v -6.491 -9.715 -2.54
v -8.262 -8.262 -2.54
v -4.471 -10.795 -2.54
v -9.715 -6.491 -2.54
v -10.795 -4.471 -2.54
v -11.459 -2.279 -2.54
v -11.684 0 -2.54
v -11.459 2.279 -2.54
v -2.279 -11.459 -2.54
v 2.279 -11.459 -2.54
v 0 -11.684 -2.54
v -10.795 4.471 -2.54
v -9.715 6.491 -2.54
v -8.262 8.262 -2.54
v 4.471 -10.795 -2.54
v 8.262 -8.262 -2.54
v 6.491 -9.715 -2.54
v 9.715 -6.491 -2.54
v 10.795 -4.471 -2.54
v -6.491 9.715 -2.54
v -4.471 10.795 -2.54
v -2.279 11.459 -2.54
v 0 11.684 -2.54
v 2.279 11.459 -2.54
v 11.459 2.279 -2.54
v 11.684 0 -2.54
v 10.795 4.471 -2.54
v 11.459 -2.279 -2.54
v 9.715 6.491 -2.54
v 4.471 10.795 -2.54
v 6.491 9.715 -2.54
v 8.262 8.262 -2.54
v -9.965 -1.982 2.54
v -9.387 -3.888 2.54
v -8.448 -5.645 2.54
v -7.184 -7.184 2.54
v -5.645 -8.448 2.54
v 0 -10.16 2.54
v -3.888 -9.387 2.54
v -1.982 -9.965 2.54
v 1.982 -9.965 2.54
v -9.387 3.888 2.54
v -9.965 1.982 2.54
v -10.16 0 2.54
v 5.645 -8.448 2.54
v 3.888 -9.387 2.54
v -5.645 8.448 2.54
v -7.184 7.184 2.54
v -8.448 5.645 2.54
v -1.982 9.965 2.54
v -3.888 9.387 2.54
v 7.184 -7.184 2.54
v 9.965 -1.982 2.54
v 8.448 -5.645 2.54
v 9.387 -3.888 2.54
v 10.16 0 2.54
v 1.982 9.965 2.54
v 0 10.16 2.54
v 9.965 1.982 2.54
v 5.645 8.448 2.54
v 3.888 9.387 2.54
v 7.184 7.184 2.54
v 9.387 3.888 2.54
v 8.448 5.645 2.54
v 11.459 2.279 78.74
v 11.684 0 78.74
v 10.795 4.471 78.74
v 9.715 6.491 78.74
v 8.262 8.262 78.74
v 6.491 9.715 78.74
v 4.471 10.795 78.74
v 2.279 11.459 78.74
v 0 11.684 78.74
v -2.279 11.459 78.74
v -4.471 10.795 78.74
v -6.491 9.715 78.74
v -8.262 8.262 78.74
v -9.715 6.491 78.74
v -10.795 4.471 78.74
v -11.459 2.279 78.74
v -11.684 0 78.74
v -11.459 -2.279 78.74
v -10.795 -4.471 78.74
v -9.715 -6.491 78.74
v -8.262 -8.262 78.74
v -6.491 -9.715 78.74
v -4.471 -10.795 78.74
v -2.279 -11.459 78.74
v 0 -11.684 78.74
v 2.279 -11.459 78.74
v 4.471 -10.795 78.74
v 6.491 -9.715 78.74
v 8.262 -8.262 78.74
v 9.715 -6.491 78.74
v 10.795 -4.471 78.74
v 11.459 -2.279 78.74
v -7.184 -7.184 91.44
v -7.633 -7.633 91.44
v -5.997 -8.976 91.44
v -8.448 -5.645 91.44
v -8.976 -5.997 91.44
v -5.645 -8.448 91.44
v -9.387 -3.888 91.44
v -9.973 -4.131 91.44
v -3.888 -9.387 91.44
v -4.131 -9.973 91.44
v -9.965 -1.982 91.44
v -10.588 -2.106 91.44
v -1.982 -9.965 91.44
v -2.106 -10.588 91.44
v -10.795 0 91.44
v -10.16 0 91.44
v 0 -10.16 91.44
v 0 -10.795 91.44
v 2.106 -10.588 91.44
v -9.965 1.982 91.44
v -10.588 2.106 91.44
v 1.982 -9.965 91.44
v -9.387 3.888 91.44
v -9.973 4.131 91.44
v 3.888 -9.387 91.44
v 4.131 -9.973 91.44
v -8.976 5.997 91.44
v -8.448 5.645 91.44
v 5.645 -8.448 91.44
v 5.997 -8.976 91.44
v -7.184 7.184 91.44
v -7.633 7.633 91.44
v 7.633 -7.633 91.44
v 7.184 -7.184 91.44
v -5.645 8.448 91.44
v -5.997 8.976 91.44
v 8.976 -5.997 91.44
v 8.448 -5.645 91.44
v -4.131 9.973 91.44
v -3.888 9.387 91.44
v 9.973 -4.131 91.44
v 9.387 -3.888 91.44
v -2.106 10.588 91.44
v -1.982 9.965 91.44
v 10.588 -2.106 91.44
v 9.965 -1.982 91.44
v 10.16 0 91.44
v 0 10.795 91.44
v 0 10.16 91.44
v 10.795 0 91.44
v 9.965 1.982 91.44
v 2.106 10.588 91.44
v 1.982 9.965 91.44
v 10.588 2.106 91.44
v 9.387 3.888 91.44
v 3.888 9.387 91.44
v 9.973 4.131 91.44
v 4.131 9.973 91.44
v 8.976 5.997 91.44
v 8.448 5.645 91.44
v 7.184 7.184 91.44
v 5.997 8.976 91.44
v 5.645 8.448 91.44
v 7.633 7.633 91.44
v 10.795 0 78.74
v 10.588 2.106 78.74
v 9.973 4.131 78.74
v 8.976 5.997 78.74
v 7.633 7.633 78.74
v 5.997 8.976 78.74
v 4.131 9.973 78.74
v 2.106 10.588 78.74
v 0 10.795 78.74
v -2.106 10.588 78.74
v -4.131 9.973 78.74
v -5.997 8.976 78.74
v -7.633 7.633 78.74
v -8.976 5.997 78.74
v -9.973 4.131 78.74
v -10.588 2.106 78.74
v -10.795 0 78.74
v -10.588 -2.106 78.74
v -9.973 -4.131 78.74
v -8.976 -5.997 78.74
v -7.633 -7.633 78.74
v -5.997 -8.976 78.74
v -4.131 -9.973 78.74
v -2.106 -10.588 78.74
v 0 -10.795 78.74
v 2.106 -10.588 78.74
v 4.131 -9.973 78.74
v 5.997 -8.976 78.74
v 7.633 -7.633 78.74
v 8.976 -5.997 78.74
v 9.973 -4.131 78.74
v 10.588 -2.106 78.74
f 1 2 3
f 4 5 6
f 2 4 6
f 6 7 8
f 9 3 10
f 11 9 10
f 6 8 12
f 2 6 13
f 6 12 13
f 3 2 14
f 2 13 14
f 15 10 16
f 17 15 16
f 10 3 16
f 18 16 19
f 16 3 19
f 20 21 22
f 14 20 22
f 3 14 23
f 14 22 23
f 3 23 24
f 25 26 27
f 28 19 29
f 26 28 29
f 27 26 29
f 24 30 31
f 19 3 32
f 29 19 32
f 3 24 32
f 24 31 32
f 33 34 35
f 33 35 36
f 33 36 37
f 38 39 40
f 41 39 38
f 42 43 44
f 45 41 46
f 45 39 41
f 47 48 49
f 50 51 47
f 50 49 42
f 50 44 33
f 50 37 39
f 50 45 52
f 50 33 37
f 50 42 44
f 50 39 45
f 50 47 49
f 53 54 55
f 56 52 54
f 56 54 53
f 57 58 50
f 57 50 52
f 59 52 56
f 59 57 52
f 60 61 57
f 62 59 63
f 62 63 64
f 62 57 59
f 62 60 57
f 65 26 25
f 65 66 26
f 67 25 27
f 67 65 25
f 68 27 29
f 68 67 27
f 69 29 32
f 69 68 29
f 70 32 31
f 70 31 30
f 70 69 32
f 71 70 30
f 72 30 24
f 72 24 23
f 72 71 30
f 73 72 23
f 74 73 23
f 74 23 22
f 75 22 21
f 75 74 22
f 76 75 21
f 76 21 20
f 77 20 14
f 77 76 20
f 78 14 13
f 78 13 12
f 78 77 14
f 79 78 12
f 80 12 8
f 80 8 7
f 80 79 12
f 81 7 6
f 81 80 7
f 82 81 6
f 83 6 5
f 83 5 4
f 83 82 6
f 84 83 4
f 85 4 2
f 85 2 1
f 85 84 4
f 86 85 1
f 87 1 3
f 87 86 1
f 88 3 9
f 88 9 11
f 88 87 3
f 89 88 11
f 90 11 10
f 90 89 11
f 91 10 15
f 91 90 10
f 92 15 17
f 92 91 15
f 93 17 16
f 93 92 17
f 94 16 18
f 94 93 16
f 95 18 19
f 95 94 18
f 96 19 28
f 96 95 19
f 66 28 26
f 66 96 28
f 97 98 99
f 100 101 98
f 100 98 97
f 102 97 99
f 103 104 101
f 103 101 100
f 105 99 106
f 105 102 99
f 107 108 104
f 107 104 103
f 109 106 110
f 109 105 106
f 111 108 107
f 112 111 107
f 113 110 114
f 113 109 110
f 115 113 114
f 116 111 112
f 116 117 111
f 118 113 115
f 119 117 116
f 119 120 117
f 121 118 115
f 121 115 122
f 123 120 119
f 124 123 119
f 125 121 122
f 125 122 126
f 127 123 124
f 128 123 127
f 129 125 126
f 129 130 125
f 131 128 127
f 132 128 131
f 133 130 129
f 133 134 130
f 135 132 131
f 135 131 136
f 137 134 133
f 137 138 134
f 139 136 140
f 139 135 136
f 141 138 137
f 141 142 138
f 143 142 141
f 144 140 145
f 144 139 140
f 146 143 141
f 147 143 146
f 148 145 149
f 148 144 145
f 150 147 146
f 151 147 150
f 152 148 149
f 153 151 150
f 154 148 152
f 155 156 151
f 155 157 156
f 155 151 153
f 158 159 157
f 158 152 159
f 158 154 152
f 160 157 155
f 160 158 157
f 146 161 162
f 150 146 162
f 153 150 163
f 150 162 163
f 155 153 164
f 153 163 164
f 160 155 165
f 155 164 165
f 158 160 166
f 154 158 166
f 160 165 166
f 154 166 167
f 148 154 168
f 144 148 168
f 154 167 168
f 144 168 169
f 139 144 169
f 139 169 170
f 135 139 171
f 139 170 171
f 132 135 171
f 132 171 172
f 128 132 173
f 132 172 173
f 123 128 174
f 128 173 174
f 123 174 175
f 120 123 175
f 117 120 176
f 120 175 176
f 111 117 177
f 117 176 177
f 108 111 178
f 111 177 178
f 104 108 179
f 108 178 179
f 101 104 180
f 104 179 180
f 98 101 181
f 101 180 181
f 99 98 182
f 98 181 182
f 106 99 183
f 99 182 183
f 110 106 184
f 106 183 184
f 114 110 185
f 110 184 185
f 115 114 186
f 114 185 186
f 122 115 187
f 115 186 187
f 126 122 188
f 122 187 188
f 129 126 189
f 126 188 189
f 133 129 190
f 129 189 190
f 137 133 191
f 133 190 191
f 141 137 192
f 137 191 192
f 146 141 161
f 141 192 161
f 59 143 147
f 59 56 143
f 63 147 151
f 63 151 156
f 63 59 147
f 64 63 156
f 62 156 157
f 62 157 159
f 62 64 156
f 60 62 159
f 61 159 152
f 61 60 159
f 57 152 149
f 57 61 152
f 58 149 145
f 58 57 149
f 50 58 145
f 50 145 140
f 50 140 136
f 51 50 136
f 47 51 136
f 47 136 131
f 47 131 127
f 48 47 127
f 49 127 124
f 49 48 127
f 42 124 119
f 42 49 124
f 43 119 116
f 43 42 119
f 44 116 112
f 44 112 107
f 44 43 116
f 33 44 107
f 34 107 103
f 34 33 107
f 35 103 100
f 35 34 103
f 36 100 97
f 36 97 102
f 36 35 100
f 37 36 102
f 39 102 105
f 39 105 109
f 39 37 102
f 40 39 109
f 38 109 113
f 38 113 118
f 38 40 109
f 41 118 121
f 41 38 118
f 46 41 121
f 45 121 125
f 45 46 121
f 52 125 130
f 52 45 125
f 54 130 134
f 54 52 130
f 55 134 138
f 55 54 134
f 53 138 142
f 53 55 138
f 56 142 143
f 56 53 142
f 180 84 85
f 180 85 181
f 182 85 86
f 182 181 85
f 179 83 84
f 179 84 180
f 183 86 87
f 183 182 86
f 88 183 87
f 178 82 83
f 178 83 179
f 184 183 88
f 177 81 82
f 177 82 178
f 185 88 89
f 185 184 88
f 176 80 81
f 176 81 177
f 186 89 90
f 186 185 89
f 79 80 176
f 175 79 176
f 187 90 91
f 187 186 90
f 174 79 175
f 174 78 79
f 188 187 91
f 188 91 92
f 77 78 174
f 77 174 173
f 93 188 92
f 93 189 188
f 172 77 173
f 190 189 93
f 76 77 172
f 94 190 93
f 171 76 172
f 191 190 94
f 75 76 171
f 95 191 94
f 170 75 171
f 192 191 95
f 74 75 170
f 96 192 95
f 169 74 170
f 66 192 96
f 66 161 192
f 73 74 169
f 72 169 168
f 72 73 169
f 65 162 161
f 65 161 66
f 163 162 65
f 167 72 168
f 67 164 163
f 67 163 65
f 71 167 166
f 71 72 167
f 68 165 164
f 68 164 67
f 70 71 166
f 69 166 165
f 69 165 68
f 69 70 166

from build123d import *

# Parameters (mm, degrees)
F0_R     = 11.684
F1_DEPTH = 78.74
F2_R     = 10.16
F3_DEPTH = 76.2
F4_DEPTH = 2.54
F5_DEPTH = 7.62
F7_DEPTH = 7.62
F6_R     = 10.795
F6_R_2   = 10.16
F9_DEPTH = 12.7


with BuildPart() as f1:
    # F0 (on Top) → F1 (new body)
    with BuildSketch(Plane.XY):
        Circle(F0_R)
    extrude(amount=F1_DEPTH)

    # F2 (on face) → F3 (cut)
    with BuildSketch(Plane.XY.offset(78.74)):
        Circle(F2_R)
    extrude(amount=-F3_DEPTH, mode=Mode.SUBTRACT)

    # F4 (add): a face of the model
    f4_faces = [f1.faces().sort_by_distance(p)[0] for p in [
        (0, 0, 0),
    ]]
    extrude(f4_faces, amount=F4_DEPTH)

    # F5 (add): a face of the model
    f5_faces = [f1.faces().sort_by_distance(p)[0] for p in [
        (0, 0, -2.54),
    ]]
    extrude(f5_faces, amount=F5_DEPTH)

    # F7 (cut): a face of the model
    f7_faces = [f1.faces().sort_by_distance(p)[0] for p in [
        (0, 0, -10.16),
    ]]
    extrude(f7_faces, amount=-F7_DEPTH, mode=Mode.SUBTRACT)

    # F6 (on face) → F9 (join)
    with BuildSketch(Plane.XY.offset(78.74)):
        Circle(F6_R)
        Circle(F6_R_2, mode=Mode.SUBTRACT)
    extrude(amount=F9_DEPTH)


solid = f1.part
